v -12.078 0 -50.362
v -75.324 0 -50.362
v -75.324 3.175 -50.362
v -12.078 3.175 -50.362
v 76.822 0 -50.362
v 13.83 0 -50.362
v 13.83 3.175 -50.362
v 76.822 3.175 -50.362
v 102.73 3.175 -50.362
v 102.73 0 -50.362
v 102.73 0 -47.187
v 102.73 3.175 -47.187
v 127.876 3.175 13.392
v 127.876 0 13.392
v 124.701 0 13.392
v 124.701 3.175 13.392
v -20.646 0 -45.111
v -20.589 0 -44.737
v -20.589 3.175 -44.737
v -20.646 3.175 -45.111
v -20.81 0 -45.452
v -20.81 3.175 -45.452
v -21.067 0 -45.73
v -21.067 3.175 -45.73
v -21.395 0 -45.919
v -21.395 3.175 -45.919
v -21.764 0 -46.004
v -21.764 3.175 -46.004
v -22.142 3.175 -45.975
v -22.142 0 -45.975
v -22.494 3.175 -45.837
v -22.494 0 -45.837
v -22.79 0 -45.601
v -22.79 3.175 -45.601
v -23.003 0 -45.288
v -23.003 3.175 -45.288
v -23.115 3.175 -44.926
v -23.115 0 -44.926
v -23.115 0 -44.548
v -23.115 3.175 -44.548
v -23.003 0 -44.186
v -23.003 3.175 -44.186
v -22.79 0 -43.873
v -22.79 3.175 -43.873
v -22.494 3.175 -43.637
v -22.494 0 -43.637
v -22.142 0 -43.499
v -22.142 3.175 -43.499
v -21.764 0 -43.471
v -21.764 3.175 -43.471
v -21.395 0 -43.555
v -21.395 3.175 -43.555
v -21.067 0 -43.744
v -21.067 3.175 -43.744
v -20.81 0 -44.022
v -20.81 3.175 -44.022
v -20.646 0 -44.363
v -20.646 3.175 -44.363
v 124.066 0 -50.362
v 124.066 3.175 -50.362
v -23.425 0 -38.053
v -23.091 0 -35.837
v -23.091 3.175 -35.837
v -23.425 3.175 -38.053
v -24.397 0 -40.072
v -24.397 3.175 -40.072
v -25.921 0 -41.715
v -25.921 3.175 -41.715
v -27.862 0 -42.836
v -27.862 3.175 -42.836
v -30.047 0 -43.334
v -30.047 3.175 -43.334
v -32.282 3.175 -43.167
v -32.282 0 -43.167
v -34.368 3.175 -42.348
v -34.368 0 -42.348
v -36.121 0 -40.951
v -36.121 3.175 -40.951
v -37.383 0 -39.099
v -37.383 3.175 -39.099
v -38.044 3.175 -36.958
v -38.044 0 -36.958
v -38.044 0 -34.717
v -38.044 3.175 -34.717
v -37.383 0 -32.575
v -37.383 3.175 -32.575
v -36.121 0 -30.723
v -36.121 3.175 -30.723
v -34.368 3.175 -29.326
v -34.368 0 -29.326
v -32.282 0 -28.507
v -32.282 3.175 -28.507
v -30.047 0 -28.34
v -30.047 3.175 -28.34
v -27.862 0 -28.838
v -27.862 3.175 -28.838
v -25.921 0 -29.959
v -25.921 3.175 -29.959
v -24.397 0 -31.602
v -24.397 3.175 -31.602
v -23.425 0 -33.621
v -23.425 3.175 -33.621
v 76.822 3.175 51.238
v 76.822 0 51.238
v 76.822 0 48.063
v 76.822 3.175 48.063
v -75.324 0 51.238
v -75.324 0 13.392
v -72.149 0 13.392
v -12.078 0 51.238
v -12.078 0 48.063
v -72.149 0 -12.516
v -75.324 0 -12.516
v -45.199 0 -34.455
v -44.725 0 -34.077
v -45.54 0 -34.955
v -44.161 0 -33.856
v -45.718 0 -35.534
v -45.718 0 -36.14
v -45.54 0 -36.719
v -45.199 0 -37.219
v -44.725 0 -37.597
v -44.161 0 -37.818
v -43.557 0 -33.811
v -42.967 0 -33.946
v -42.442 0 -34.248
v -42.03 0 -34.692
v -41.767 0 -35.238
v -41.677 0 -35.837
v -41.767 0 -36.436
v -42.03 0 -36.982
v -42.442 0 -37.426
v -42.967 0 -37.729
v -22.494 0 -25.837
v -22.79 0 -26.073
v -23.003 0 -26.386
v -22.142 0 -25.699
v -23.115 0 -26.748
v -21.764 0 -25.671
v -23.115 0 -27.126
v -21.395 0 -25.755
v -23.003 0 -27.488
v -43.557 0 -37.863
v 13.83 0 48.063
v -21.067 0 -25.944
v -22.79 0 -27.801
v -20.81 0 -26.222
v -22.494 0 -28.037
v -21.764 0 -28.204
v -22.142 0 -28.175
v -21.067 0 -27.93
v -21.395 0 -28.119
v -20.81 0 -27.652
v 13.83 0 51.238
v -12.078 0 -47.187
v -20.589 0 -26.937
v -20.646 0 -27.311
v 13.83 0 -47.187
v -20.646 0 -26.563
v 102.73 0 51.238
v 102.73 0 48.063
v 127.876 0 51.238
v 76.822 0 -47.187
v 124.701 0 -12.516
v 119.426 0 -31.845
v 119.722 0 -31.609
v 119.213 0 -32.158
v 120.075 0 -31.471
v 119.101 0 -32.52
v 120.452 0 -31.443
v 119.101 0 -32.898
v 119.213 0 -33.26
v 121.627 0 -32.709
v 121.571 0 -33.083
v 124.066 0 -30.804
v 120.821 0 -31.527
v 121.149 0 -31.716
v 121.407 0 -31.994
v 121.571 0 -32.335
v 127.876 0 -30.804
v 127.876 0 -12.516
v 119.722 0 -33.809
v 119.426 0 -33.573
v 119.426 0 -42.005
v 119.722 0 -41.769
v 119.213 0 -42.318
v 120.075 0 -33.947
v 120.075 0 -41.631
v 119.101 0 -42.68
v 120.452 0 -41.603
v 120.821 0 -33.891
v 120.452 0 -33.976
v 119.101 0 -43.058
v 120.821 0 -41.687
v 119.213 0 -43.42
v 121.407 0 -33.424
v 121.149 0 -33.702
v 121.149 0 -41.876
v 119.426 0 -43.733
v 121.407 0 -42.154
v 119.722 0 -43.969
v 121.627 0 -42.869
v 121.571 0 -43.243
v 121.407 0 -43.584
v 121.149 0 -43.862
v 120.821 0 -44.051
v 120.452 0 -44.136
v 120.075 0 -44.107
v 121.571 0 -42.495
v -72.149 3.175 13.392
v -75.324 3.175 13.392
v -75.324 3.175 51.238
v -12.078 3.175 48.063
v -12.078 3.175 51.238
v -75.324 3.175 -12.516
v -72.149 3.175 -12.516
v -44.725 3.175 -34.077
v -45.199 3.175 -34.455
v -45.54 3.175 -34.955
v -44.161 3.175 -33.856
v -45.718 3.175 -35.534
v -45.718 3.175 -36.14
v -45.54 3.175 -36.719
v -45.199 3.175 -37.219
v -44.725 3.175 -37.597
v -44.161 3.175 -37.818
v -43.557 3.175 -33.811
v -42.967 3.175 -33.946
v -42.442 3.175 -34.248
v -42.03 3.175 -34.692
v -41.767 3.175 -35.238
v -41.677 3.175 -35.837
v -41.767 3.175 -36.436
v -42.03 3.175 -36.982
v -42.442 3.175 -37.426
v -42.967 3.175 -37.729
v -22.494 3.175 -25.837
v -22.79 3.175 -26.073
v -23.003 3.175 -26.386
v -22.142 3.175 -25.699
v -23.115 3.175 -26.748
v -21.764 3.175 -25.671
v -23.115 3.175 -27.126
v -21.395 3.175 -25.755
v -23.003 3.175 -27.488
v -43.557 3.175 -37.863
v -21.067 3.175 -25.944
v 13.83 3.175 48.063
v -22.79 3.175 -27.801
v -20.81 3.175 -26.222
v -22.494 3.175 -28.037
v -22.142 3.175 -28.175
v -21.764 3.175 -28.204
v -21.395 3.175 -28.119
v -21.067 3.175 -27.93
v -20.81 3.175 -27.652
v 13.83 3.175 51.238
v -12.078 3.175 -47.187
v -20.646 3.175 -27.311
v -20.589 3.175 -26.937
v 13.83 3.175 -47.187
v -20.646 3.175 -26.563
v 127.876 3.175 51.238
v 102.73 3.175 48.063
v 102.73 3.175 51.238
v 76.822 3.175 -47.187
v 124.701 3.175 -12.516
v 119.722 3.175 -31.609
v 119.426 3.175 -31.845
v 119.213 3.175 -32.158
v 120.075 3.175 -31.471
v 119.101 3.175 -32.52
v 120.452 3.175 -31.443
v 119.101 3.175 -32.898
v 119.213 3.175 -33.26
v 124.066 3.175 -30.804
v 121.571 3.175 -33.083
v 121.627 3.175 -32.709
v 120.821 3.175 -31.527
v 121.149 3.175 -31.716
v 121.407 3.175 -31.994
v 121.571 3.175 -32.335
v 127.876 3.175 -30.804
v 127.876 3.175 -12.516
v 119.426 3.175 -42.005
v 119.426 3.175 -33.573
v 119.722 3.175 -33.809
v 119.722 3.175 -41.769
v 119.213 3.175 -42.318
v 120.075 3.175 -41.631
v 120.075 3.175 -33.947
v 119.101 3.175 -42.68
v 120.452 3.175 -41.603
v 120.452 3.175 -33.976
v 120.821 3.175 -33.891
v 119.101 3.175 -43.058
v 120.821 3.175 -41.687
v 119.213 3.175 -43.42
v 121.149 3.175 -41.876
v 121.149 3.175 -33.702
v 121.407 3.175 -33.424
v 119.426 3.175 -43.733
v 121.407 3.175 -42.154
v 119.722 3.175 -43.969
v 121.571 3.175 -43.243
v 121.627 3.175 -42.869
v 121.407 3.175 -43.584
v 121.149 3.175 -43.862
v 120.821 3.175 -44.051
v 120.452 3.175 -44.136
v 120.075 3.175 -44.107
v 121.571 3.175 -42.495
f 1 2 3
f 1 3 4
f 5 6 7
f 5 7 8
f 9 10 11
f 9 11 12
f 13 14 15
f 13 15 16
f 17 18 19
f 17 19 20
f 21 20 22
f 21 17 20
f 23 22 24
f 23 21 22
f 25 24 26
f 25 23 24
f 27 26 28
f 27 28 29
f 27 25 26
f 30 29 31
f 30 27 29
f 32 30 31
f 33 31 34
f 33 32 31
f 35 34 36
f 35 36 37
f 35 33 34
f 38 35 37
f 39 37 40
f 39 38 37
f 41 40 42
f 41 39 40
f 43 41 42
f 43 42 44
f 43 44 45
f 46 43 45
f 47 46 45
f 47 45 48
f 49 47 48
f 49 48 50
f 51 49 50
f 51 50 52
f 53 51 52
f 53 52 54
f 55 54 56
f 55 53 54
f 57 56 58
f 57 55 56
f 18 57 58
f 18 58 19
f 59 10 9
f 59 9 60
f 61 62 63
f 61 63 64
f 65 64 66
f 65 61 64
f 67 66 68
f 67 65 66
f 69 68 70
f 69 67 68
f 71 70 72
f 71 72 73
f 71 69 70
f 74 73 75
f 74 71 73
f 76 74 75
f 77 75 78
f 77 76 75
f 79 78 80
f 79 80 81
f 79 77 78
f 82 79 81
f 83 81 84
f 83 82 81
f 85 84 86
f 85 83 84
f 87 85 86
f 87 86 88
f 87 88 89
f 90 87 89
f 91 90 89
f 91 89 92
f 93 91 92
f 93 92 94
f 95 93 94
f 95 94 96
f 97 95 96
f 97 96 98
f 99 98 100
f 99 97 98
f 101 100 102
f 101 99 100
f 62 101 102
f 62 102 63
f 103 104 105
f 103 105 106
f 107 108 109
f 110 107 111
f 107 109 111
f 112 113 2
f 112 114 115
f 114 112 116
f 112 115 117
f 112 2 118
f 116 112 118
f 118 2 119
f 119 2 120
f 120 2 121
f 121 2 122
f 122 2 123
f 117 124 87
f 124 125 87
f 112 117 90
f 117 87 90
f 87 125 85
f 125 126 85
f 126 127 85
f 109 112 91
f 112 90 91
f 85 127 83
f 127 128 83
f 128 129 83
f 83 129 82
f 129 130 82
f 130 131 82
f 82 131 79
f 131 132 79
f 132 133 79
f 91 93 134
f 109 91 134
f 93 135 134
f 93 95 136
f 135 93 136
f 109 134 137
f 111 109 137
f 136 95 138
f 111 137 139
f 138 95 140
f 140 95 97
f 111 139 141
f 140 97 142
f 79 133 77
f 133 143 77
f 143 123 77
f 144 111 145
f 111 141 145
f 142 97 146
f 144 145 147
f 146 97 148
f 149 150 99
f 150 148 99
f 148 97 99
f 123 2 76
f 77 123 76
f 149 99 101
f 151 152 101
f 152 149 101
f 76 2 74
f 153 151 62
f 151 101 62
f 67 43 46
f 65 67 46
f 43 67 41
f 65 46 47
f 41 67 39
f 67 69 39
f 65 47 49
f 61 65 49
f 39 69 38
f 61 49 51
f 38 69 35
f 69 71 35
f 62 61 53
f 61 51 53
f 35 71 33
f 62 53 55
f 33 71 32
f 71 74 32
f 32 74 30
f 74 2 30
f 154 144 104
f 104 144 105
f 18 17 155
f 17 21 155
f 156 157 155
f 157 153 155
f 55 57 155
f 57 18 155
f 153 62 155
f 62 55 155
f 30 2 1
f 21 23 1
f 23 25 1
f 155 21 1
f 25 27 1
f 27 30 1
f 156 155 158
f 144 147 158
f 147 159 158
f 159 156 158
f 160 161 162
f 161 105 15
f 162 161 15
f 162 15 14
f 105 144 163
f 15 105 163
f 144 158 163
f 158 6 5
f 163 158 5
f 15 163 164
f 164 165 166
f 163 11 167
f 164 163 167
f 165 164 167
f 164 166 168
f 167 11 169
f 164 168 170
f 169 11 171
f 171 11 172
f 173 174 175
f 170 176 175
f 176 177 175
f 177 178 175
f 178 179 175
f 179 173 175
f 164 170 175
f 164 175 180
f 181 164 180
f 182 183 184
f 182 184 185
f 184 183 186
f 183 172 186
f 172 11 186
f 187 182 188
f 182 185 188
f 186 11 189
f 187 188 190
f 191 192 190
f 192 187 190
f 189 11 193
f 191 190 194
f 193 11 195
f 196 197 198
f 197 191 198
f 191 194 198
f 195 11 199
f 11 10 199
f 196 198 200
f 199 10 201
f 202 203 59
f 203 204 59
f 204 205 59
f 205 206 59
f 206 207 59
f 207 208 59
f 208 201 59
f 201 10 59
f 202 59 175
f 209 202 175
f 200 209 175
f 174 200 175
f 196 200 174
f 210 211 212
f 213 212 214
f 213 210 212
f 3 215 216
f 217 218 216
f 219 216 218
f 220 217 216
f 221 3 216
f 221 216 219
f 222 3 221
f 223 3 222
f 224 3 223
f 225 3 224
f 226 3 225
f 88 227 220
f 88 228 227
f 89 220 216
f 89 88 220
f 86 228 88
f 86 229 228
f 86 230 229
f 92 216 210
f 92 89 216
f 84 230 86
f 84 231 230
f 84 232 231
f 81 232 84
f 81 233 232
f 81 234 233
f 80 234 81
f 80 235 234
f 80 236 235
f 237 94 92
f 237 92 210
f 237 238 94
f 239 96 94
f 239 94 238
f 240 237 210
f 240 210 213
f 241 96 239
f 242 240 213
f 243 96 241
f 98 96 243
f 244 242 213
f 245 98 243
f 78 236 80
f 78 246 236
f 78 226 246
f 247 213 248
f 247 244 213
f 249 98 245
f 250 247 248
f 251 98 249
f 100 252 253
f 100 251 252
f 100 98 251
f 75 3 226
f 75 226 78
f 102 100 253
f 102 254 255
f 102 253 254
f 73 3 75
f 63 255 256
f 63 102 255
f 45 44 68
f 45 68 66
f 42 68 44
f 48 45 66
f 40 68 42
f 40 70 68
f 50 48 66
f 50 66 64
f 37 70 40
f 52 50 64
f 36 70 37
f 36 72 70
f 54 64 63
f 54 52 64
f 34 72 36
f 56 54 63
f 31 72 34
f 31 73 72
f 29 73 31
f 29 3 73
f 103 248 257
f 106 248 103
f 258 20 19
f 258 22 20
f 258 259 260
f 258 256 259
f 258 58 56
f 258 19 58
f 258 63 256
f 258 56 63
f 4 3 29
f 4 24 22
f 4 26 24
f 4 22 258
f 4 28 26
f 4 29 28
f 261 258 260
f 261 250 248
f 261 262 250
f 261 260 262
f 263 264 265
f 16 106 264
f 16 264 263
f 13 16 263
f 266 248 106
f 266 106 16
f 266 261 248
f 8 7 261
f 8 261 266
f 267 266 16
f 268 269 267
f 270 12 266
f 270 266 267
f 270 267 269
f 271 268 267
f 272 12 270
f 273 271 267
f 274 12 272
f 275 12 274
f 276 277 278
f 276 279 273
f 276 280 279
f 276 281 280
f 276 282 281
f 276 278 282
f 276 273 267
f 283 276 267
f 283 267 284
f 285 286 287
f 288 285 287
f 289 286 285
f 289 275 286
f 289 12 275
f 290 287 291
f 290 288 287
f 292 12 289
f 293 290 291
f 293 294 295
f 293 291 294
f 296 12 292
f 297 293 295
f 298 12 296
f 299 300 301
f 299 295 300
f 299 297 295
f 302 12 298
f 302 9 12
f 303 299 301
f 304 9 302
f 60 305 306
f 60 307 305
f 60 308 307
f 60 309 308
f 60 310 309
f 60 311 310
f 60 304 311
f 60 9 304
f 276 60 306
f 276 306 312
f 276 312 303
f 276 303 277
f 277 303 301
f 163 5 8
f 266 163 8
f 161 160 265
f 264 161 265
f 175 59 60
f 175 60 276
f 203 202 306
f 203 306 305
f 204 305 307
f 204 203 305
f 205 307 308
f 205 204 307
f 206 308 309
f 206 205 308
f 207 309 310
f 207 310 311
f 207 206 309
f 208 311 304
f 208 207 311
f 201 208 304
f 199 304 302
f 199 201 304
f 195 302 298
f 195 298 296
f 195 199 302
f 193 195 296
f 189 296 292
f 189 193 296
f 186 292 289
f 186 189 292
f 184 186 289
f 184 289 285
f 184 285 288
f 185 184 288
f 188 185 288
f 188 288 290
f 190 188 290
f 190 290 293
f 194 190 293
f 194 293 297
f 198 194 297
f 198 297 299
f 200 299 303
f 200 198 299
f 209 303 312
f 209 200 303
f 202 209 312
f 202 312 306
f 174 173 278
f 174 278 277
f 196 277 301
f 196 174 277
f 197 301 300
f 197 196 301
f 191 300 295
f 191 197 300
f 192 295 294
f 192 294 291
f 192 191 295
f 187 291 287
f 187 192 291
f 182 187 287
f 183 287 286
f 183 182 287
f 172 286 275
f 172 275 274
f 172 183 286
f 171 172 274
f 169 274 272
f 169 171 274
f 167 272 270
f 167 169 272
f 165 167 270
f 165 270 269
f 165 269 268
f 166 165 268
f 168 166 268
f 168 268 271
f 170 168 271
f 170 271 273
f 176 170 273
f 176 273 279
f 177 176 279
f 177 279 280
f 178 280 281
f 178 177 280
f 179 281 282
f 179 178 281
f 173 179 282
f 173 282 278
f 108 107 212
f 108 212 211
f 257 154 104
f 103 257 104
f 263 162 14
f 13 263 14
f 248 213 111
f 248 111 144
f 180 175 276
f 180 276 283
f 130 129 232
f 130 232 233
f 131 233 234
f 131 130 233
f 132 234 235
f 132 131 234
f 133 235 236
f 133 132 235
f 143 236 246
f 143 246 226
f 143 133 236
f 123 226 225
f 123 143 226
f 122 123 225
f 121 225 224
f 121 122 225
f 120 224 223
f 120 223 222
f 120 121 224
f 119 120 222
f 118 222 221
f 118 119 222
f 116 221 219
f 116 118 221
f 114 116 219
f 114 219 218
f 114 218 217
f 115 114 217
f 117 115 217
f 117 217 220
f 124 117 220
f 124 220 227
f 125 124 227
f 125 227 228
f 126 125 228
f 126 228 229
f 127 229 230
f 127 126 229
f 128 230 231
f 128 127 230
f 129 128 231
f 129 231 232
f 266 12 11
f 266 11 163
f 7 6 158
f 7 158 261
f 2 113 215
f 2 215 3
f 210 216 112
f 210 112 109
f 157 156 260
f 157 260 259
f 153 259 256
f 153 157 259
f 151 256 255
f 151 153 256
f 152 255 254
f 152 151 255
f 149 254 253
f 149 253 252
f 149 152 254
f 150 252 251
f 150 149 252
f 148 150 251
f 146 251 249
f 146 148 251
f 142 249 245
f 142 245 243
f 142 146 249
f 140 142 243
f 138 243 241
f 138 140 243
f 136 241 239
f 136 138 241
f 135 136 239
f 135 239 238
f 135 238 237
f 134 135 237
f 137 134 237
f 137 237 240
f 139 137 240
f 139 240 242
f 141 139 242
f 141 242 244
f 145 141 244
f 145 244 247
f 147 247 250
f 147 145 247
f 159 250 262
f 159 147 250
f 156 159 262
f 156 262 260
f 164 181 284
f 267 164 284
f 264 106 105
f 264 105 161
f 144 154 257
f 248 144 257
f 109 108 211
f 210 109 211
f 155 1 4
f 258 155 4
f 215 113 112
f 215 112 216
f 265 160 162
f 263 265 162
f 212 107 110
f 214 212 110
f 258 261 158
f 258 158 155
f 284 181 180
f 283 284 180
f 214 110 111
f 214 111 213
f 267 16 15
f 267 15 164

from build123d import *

# Parameters (mm, degrees)
SKETCH1_W           = 203.2
SKETCH1_H           = 101.6
SKETCH1_R           = 1.27
SKETCH1_R_2         = 7.5184
SKETCH1_R_3         = 2.032
BOSS_EXTRUDE1_DEPTH = 3.175
SKETCH2_W           = 25.908
SKETCH2_H           = 3.175
CUT_EXTRUDE1_DEPTH  = 3.175
SKETCH3_W           = 25.908
SKETCH3_H           = 3.175
CUT_EXTRUDE2_DEPTH  = 3.175
SKETCH5_W           = 25.908
SKETCH5_H           = 3.175
CUT_EXTRUDE3_DEPTH  = 3.175
SKETCH6_W           = 25.908
SKETCH6_H           = 3.175
CUT_EXTRUDE4_DEPTH  = 3.175
SKETCH7_W           = 3.81
SKETCH7_H           = 19.558
CUT_EXTRUDE5_DEPTH  = 3.175


with BuildPart() as part:
    # Sketch1 → Boss-Extrude1 (new body)
    with BuildSketch(Plane(origin=(0, 0, 0), x_dir=(1, 0, 0), z_dir=(0, 1, 0))):
        with Locations((26.275862069, -0.437931034)):
            Rectangle(SKETCH1_W, SKETCH1_H)
        with Locations((120.357219561, 32.709068966)):
            Circle(SKETCH1_R, mode=Mode.SUBTRACT)
        with Locations((120.357219561, 42.869068966)):
            Circle(SKETCH1_R, mode=Mode.SUBTRACT)
        with Locations((-30.609137931, 35.837068966)):
            Circle(SKETCH1_R_2, mode=Mode.SUBTRACT)
        with Locations((-43.709137931, 35.837068966)):
            Circle(SKETCH1_R_3, mode=Mode.SUBTRACT)
        with Locations((-21.859137931, 44.737068966)):
            Circle(SKETCH1_R, mode=Mode.SUBTRACT)
        with Locations((-21.859137931, 26.937068966)):
            Circle(SKETCH1_R, mode=Mode.SUBTRACT)
    extrude(amount=BOSS_EXTRUDE1_DEPTH)

    # Sketch2 → Cut-Extrude1 (cut)
    with BuildSketch(Plane(origin=(0, 0, -50.362068966), x_dir=(-1, 0, 0), z_dir=(0, 0, -1))):
        with Locations((-89.775862069, 1.5875)):
            Rectangle(SKETCH2_W, SKETCH2_H)
        with Locations((-0.875862069, 1.5875)):
            Rectangle(SKETCH2_W, SKETCH2_H)
    extrude(amount=-CUT_EXTRUDE1_DEPTH, mode=Mode.SUBTRACT)

    # Sketch3 → Cut-Extrude2 (cut)
    with BuildSketch(Plane.XY.offset(51.237931034)):
        with Locations((0.875862069, 1.5875)):
            Rectangle(SKETCH3_W, SKETCH3_H)
        with Locations((89.775862069, 1.5875)):
            Rectangle(SKETCH3_W, SKETCH3_H)
    extrude(amount=-CUT_EXTRUDE2_DEPTH, mode=Mode.SUBTRACT)

    # Sketch5 → Cut-Extrude3 (cut)
    with BuildSketch(Plane.ZY.offset(75.324137931)):
        with Locations((0.437931034, 1.5875)):
            Rectangle(SKETCH5_W, SKETCH5_H)
    extrude(amount=-CUT_EXTRUDE3_DEPTH, mode=Mode.SUBTRACT)

    # Sketch6 → Cut-Extrude4 (cut)
    with BuildSketch(Plane(origin=(127.875862069, 0, 0), x_dir=(0, 0, -1), z_dir=(1, 0, 0))):
        with Locations((-0.437931034, 1.5875)):
            Rectangle(SKETCH6_W, SKETCH6_H)
    extrude(amount=-CUT_EXTRUDE4_DEPTH, mode=Mode.SUBTRACT)

    # Sketch7 → Cut-Extrude5 (cut)
    with BuildSketch(Plane.XZ):
        with Locations((125.970862069, -40.583068966)):
            Rectangle(SKETCH7_W, SKETCH7_H)
    extrude(amount=-CUT_EXTRUDE5_DEPTH, mode=Mode.SUBTRACT)


solid = part.part
